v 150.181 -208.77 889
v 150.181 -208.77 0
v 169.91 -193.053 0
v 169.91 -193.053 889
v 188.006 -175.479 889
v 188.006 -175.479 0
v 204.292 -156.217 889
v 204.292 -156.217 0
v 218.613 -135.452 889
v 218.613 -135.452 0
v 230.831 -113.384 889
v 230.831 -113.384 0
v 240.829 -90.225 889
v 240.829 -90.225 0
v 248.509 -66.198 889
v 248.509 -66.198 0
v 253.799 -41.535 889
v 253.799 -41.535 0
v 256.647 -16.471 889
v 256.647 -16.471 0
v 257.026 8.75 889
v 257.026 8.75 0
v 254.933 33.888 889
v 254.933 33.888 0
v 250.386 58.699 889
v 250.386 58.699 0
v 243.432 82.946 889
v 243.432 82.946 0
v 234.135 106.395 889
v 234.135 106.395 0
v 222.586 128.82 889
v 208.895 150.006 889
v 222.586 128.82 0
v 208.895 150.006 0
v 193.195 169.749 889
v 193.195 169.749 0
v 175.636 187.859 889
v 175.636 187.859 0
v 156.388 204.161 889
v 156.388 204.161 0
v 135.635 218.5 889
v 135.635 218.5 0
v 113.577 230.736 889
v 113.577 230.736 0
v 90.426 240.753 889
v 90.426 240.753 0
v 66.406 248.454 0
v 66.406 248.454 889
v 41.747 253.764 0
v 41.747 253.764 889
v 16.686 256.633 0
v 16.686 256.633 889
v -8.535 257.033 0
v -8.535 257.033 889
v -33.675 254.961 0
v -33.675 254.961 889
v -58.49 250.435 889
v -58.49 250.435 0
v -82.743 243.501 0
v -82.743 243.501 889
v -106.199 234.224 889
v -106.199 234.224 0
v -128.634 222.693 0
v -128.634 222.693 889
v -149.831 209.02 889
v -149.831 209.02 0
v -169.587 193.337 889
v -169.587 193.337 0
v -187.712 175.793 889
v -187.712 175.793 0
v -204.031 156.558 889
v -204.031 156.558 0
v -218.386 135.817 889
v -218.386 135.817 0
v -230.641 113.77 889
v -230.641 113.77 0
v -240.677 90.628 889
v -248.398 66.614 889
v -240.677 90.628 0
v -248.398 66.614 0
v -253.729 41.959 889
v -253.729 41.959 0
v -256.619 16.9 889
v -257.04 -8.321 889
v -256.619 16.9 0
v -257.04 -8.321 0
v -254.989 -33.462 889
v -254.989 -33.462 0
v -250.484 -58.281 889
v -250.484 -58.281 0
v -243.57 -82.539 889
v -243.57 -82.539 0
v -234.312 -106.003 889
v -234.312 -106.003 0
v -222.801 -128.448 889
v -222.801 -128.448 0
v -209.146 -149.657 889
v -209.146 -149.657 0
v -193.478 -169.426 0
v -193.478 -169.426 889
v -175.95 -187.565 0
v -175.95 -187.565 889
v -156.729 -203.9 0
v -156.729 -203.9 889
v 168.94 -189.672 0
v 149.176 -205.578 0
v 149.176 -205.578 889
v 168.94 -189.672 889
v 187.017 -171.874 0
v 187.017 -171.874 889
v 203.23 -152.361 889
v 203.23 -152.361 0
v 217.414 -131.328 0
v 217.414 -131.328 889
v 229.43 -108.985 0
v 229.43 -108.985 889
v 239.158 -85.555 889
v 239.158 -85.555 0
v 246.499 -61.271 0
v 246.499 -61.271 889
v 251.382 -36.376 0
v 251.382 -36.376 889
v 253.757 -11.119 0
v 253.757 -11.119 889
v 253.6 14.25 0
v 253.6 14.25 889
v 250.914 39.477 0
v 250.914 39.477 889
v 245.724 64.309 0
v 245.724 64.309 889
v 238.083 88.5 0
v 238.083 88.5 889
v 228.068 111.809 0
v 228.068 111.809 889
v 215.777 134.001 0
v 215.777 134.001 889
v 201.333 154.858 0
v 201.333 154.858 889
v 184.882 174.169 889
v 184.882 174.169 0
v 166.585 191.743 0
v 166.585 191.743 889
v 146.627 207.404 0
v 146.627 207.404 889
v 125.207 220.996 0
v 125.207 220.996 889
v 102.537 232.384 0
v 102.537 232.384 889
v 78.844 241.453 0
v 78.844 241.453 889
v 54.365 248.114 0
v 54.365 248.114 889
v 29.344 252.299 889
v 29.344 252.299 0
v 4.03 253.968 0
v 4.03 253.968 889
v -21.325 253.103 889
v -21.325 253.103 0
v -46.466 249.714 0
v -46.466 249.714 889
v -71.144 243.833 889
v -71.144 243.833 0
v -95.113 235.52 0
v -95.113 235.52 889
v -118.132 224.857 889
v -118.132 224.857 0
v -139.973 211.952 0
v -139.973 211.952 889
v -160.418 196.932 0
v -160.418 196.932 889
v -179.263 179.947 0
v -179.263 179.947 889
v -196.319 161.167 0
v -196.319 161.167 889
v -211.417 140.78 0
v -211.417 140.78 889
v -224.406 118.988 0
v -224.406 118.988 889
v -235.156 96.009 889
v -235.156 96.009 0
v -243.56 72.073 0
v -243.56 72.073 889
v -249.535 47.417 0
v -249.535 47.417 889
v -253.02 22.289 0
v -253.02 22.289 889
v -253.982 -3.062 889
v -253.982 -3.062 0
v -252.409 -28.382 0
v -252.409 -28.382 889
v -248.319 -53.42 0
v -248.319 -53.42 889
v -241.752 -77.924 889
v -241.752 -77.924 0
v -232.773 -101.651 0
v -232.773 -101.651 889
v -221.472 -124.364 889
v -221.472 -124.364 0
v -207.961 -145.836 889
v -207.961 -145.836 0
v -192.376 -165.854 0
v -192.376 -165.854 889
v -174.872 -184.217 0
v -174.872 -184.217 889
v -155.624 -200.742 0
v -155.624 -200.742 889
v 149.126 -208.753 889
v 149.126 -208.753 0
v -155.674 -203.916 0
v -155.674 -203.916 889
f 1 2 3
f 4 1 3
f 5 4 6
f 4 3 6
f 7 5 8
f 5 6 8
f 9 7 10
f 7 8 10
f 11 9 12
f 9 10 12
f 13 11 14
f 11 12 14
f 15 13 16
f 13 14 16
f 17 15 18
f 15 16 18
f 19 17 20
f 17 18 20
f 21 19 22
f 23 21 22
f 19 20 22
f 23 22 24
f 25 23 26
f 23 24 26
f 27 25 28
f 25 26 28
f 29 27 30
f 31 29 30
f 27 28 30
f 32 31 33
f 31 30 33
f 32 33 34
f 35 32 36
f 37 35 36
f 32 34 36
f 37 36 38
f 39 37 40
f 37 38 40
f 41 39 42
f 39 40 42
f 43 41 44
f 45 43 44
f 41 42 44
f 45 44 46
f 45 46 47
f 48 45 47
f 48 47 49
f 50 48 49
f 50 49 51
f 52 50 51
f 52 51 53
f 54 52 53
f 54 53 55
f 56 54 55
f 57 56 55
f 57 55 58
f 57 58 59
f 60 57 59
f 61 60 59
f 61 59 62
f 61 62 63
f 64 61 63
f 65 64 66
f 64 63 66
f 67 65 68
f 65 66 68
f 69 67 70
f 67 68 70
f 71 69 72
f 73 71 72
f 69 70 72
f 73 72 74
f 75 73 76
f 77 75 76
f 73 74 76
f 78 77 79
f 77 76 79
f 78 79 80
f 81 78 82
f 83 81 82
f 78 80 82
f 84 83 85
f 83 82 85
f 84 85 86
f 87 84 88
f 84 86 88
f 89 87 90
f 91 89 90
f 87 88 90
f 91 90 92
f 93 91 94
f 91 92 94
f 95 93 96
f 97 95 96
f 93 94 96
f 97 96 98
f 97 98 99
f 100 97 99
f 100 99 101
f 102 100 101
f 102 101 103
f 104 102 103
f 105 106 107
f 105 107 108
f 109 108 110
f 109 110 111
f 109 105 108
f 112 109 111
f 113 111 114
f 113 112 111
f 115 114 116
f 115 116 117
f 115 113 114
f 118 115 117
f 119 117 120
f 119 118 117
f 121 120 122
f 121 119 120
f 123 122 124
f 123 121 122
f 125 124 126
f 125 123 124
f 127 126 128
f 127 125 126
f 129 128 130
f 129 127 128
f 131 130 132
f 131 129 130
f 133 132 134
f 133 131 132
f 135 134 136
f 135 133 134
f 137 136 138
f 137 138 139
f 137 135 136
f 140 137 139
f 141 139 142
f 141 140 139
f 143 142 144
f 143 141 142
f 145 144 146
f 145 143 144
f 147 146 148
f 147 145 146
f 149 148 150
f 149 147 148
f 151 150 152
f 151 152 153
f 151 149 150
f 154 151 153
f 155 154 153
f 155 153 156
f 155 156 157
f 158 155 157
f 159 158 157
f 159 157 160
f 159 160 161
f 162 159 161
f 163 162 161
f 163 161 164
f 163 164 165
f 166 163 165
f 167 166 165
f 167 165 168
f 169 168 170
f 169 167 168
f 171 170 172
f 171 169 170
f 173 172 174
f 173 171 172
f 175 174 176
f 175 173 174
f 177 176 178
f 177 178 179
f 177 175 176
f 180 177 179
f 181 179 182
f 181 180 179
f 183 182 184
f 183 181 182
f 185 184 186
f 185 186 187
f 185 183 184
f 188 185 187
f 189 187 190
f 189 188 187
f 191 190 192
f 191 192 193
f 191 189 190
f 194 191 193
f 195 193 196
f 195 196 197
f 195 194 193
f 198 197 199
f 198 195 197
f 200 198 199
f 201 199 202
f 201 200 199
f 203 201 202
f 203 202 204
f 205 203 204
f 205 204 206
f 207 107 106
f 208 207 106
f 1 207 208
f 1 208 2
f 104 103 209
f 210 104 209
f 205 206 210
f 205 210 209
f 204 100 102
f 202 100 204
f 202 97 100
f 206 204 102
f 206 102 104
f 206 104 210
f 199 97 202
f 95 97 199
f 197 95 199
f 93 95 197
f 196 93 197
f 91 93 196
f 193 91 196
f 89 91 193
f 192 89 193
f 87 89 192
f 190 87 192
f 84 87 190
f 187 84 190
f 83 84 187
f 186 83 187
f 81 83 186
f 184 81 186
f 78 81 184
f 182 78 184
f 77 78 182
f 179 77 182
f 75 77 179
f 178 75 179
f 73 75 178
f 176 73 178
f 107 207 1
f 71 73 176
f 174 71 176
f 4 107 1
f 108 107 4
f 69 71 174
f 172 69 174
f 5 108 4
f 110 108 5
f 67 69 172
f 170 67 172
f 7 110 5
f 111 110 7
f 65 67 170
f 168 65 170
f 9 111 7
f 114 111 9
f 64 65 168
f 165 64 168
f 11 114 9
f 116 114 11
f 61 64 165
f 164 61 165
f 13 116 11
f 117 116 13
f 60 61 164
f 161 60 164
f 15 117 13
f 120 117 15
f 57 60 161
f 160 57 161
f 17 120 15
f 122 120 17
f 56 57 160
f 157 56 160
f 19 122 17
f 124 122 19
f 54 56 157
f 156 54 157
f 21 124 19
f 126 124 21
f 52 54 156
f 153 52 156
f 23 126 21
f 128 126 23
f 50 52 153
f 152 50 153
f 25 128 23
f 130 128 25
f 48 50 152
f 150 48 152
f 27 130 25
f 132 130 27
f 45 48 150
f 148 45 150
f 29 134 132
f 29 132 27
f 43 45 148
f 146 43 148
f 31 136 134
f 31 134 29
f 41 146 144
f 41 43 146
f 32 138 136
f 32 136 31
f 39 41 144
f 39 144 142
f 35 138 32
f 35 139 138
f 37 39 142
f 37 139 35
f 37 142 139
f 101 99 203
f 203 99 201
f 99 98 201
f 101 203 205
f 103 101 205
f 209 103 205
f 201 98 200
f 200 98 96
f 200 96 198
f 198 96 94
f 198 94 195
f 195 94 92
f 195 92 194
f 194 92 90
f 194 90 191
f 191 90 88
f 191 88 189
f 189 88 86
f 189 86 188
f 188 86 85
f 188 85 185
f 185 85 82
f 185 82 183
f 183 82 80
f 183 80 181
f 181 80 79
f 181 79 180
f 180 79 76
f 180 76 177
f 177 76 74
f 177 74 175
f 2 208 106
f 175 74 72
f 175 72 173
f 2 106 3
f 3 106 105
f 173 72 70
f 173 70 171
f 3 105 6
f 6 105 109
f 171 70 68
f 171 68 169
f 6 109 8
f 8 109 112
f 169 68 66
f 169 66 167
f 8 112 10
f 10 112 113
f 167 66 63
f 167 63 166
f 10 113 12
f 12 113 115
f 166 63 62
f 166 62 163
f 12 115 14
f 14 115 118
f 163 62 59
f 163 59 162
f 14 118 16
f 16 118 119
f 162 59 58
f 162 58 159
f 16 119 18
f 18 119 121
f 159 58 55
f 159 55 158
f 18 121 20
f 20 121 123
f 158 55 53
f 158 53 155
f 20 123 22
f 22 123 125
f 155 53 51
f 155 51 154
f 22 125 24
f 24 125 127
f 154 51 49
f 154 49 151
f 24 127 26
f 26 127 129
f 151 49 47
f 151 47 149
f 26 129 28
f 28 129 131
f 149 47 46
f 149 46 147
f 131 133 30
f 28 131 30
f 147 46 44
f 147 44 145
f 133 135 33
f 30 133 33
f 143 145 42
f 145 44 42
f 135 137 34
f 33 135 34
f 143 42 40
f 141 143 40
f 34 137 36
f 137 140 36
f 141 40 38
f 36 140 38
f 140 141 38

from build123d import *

# Parameters (mm, degrees)
EXTRUDE_THIN1_DEPTH = 889
SKETCH5_W           = 304.838367632
SKETCH5_H           = 889
CUT_EXTRUDE1_DEPTH  = 1035.425821721


with BuildPart() as part:
    # Sketch2 → Extrude-Thin1 (new body)
    with BuildSketch(Plane.XY):
        with BuildLine():
            Line((-156.728695436, -203.89972205), (150.180738454, -208.769553389))
            ThreePointArc((150.180738454, -208.769553389), (4.080165374, 257.142631385), (-156.728695436, -203.89972205))
        make_face()
        with BuildLine():
            Line((-155.623606079, -200.741857197), (149.176393921, -205.578217466))
            ThreePointArc((149.176393921, -205.578217466), (4.029792962, 253.968030997), (-155.623606079, -200.741857197))
        make_face(mode=Mode.SUBTRACT)
    extrude(amount=EXTRUDE_THIN1_DEPTH)

    # Sketch5 → Cut-Extrude1 (cut, through all)
    with BuildSketch(Plane(origin=(-3.223606079, -203.160037332, 0), x_dir=(0.9998741377849476, -0.01586532662152281, 0), z_dir=(0.01586532662152281, 0.9998741377849476, 0))):
        with Locations((0, -444.5)):
            Rectangle(SKETCH5_W, SKETCH5_H)
    extrude(amount=-CUT_EXTRUDE1_DEPTH, mode=Mode.SUBTRACT)


solid = part.part
